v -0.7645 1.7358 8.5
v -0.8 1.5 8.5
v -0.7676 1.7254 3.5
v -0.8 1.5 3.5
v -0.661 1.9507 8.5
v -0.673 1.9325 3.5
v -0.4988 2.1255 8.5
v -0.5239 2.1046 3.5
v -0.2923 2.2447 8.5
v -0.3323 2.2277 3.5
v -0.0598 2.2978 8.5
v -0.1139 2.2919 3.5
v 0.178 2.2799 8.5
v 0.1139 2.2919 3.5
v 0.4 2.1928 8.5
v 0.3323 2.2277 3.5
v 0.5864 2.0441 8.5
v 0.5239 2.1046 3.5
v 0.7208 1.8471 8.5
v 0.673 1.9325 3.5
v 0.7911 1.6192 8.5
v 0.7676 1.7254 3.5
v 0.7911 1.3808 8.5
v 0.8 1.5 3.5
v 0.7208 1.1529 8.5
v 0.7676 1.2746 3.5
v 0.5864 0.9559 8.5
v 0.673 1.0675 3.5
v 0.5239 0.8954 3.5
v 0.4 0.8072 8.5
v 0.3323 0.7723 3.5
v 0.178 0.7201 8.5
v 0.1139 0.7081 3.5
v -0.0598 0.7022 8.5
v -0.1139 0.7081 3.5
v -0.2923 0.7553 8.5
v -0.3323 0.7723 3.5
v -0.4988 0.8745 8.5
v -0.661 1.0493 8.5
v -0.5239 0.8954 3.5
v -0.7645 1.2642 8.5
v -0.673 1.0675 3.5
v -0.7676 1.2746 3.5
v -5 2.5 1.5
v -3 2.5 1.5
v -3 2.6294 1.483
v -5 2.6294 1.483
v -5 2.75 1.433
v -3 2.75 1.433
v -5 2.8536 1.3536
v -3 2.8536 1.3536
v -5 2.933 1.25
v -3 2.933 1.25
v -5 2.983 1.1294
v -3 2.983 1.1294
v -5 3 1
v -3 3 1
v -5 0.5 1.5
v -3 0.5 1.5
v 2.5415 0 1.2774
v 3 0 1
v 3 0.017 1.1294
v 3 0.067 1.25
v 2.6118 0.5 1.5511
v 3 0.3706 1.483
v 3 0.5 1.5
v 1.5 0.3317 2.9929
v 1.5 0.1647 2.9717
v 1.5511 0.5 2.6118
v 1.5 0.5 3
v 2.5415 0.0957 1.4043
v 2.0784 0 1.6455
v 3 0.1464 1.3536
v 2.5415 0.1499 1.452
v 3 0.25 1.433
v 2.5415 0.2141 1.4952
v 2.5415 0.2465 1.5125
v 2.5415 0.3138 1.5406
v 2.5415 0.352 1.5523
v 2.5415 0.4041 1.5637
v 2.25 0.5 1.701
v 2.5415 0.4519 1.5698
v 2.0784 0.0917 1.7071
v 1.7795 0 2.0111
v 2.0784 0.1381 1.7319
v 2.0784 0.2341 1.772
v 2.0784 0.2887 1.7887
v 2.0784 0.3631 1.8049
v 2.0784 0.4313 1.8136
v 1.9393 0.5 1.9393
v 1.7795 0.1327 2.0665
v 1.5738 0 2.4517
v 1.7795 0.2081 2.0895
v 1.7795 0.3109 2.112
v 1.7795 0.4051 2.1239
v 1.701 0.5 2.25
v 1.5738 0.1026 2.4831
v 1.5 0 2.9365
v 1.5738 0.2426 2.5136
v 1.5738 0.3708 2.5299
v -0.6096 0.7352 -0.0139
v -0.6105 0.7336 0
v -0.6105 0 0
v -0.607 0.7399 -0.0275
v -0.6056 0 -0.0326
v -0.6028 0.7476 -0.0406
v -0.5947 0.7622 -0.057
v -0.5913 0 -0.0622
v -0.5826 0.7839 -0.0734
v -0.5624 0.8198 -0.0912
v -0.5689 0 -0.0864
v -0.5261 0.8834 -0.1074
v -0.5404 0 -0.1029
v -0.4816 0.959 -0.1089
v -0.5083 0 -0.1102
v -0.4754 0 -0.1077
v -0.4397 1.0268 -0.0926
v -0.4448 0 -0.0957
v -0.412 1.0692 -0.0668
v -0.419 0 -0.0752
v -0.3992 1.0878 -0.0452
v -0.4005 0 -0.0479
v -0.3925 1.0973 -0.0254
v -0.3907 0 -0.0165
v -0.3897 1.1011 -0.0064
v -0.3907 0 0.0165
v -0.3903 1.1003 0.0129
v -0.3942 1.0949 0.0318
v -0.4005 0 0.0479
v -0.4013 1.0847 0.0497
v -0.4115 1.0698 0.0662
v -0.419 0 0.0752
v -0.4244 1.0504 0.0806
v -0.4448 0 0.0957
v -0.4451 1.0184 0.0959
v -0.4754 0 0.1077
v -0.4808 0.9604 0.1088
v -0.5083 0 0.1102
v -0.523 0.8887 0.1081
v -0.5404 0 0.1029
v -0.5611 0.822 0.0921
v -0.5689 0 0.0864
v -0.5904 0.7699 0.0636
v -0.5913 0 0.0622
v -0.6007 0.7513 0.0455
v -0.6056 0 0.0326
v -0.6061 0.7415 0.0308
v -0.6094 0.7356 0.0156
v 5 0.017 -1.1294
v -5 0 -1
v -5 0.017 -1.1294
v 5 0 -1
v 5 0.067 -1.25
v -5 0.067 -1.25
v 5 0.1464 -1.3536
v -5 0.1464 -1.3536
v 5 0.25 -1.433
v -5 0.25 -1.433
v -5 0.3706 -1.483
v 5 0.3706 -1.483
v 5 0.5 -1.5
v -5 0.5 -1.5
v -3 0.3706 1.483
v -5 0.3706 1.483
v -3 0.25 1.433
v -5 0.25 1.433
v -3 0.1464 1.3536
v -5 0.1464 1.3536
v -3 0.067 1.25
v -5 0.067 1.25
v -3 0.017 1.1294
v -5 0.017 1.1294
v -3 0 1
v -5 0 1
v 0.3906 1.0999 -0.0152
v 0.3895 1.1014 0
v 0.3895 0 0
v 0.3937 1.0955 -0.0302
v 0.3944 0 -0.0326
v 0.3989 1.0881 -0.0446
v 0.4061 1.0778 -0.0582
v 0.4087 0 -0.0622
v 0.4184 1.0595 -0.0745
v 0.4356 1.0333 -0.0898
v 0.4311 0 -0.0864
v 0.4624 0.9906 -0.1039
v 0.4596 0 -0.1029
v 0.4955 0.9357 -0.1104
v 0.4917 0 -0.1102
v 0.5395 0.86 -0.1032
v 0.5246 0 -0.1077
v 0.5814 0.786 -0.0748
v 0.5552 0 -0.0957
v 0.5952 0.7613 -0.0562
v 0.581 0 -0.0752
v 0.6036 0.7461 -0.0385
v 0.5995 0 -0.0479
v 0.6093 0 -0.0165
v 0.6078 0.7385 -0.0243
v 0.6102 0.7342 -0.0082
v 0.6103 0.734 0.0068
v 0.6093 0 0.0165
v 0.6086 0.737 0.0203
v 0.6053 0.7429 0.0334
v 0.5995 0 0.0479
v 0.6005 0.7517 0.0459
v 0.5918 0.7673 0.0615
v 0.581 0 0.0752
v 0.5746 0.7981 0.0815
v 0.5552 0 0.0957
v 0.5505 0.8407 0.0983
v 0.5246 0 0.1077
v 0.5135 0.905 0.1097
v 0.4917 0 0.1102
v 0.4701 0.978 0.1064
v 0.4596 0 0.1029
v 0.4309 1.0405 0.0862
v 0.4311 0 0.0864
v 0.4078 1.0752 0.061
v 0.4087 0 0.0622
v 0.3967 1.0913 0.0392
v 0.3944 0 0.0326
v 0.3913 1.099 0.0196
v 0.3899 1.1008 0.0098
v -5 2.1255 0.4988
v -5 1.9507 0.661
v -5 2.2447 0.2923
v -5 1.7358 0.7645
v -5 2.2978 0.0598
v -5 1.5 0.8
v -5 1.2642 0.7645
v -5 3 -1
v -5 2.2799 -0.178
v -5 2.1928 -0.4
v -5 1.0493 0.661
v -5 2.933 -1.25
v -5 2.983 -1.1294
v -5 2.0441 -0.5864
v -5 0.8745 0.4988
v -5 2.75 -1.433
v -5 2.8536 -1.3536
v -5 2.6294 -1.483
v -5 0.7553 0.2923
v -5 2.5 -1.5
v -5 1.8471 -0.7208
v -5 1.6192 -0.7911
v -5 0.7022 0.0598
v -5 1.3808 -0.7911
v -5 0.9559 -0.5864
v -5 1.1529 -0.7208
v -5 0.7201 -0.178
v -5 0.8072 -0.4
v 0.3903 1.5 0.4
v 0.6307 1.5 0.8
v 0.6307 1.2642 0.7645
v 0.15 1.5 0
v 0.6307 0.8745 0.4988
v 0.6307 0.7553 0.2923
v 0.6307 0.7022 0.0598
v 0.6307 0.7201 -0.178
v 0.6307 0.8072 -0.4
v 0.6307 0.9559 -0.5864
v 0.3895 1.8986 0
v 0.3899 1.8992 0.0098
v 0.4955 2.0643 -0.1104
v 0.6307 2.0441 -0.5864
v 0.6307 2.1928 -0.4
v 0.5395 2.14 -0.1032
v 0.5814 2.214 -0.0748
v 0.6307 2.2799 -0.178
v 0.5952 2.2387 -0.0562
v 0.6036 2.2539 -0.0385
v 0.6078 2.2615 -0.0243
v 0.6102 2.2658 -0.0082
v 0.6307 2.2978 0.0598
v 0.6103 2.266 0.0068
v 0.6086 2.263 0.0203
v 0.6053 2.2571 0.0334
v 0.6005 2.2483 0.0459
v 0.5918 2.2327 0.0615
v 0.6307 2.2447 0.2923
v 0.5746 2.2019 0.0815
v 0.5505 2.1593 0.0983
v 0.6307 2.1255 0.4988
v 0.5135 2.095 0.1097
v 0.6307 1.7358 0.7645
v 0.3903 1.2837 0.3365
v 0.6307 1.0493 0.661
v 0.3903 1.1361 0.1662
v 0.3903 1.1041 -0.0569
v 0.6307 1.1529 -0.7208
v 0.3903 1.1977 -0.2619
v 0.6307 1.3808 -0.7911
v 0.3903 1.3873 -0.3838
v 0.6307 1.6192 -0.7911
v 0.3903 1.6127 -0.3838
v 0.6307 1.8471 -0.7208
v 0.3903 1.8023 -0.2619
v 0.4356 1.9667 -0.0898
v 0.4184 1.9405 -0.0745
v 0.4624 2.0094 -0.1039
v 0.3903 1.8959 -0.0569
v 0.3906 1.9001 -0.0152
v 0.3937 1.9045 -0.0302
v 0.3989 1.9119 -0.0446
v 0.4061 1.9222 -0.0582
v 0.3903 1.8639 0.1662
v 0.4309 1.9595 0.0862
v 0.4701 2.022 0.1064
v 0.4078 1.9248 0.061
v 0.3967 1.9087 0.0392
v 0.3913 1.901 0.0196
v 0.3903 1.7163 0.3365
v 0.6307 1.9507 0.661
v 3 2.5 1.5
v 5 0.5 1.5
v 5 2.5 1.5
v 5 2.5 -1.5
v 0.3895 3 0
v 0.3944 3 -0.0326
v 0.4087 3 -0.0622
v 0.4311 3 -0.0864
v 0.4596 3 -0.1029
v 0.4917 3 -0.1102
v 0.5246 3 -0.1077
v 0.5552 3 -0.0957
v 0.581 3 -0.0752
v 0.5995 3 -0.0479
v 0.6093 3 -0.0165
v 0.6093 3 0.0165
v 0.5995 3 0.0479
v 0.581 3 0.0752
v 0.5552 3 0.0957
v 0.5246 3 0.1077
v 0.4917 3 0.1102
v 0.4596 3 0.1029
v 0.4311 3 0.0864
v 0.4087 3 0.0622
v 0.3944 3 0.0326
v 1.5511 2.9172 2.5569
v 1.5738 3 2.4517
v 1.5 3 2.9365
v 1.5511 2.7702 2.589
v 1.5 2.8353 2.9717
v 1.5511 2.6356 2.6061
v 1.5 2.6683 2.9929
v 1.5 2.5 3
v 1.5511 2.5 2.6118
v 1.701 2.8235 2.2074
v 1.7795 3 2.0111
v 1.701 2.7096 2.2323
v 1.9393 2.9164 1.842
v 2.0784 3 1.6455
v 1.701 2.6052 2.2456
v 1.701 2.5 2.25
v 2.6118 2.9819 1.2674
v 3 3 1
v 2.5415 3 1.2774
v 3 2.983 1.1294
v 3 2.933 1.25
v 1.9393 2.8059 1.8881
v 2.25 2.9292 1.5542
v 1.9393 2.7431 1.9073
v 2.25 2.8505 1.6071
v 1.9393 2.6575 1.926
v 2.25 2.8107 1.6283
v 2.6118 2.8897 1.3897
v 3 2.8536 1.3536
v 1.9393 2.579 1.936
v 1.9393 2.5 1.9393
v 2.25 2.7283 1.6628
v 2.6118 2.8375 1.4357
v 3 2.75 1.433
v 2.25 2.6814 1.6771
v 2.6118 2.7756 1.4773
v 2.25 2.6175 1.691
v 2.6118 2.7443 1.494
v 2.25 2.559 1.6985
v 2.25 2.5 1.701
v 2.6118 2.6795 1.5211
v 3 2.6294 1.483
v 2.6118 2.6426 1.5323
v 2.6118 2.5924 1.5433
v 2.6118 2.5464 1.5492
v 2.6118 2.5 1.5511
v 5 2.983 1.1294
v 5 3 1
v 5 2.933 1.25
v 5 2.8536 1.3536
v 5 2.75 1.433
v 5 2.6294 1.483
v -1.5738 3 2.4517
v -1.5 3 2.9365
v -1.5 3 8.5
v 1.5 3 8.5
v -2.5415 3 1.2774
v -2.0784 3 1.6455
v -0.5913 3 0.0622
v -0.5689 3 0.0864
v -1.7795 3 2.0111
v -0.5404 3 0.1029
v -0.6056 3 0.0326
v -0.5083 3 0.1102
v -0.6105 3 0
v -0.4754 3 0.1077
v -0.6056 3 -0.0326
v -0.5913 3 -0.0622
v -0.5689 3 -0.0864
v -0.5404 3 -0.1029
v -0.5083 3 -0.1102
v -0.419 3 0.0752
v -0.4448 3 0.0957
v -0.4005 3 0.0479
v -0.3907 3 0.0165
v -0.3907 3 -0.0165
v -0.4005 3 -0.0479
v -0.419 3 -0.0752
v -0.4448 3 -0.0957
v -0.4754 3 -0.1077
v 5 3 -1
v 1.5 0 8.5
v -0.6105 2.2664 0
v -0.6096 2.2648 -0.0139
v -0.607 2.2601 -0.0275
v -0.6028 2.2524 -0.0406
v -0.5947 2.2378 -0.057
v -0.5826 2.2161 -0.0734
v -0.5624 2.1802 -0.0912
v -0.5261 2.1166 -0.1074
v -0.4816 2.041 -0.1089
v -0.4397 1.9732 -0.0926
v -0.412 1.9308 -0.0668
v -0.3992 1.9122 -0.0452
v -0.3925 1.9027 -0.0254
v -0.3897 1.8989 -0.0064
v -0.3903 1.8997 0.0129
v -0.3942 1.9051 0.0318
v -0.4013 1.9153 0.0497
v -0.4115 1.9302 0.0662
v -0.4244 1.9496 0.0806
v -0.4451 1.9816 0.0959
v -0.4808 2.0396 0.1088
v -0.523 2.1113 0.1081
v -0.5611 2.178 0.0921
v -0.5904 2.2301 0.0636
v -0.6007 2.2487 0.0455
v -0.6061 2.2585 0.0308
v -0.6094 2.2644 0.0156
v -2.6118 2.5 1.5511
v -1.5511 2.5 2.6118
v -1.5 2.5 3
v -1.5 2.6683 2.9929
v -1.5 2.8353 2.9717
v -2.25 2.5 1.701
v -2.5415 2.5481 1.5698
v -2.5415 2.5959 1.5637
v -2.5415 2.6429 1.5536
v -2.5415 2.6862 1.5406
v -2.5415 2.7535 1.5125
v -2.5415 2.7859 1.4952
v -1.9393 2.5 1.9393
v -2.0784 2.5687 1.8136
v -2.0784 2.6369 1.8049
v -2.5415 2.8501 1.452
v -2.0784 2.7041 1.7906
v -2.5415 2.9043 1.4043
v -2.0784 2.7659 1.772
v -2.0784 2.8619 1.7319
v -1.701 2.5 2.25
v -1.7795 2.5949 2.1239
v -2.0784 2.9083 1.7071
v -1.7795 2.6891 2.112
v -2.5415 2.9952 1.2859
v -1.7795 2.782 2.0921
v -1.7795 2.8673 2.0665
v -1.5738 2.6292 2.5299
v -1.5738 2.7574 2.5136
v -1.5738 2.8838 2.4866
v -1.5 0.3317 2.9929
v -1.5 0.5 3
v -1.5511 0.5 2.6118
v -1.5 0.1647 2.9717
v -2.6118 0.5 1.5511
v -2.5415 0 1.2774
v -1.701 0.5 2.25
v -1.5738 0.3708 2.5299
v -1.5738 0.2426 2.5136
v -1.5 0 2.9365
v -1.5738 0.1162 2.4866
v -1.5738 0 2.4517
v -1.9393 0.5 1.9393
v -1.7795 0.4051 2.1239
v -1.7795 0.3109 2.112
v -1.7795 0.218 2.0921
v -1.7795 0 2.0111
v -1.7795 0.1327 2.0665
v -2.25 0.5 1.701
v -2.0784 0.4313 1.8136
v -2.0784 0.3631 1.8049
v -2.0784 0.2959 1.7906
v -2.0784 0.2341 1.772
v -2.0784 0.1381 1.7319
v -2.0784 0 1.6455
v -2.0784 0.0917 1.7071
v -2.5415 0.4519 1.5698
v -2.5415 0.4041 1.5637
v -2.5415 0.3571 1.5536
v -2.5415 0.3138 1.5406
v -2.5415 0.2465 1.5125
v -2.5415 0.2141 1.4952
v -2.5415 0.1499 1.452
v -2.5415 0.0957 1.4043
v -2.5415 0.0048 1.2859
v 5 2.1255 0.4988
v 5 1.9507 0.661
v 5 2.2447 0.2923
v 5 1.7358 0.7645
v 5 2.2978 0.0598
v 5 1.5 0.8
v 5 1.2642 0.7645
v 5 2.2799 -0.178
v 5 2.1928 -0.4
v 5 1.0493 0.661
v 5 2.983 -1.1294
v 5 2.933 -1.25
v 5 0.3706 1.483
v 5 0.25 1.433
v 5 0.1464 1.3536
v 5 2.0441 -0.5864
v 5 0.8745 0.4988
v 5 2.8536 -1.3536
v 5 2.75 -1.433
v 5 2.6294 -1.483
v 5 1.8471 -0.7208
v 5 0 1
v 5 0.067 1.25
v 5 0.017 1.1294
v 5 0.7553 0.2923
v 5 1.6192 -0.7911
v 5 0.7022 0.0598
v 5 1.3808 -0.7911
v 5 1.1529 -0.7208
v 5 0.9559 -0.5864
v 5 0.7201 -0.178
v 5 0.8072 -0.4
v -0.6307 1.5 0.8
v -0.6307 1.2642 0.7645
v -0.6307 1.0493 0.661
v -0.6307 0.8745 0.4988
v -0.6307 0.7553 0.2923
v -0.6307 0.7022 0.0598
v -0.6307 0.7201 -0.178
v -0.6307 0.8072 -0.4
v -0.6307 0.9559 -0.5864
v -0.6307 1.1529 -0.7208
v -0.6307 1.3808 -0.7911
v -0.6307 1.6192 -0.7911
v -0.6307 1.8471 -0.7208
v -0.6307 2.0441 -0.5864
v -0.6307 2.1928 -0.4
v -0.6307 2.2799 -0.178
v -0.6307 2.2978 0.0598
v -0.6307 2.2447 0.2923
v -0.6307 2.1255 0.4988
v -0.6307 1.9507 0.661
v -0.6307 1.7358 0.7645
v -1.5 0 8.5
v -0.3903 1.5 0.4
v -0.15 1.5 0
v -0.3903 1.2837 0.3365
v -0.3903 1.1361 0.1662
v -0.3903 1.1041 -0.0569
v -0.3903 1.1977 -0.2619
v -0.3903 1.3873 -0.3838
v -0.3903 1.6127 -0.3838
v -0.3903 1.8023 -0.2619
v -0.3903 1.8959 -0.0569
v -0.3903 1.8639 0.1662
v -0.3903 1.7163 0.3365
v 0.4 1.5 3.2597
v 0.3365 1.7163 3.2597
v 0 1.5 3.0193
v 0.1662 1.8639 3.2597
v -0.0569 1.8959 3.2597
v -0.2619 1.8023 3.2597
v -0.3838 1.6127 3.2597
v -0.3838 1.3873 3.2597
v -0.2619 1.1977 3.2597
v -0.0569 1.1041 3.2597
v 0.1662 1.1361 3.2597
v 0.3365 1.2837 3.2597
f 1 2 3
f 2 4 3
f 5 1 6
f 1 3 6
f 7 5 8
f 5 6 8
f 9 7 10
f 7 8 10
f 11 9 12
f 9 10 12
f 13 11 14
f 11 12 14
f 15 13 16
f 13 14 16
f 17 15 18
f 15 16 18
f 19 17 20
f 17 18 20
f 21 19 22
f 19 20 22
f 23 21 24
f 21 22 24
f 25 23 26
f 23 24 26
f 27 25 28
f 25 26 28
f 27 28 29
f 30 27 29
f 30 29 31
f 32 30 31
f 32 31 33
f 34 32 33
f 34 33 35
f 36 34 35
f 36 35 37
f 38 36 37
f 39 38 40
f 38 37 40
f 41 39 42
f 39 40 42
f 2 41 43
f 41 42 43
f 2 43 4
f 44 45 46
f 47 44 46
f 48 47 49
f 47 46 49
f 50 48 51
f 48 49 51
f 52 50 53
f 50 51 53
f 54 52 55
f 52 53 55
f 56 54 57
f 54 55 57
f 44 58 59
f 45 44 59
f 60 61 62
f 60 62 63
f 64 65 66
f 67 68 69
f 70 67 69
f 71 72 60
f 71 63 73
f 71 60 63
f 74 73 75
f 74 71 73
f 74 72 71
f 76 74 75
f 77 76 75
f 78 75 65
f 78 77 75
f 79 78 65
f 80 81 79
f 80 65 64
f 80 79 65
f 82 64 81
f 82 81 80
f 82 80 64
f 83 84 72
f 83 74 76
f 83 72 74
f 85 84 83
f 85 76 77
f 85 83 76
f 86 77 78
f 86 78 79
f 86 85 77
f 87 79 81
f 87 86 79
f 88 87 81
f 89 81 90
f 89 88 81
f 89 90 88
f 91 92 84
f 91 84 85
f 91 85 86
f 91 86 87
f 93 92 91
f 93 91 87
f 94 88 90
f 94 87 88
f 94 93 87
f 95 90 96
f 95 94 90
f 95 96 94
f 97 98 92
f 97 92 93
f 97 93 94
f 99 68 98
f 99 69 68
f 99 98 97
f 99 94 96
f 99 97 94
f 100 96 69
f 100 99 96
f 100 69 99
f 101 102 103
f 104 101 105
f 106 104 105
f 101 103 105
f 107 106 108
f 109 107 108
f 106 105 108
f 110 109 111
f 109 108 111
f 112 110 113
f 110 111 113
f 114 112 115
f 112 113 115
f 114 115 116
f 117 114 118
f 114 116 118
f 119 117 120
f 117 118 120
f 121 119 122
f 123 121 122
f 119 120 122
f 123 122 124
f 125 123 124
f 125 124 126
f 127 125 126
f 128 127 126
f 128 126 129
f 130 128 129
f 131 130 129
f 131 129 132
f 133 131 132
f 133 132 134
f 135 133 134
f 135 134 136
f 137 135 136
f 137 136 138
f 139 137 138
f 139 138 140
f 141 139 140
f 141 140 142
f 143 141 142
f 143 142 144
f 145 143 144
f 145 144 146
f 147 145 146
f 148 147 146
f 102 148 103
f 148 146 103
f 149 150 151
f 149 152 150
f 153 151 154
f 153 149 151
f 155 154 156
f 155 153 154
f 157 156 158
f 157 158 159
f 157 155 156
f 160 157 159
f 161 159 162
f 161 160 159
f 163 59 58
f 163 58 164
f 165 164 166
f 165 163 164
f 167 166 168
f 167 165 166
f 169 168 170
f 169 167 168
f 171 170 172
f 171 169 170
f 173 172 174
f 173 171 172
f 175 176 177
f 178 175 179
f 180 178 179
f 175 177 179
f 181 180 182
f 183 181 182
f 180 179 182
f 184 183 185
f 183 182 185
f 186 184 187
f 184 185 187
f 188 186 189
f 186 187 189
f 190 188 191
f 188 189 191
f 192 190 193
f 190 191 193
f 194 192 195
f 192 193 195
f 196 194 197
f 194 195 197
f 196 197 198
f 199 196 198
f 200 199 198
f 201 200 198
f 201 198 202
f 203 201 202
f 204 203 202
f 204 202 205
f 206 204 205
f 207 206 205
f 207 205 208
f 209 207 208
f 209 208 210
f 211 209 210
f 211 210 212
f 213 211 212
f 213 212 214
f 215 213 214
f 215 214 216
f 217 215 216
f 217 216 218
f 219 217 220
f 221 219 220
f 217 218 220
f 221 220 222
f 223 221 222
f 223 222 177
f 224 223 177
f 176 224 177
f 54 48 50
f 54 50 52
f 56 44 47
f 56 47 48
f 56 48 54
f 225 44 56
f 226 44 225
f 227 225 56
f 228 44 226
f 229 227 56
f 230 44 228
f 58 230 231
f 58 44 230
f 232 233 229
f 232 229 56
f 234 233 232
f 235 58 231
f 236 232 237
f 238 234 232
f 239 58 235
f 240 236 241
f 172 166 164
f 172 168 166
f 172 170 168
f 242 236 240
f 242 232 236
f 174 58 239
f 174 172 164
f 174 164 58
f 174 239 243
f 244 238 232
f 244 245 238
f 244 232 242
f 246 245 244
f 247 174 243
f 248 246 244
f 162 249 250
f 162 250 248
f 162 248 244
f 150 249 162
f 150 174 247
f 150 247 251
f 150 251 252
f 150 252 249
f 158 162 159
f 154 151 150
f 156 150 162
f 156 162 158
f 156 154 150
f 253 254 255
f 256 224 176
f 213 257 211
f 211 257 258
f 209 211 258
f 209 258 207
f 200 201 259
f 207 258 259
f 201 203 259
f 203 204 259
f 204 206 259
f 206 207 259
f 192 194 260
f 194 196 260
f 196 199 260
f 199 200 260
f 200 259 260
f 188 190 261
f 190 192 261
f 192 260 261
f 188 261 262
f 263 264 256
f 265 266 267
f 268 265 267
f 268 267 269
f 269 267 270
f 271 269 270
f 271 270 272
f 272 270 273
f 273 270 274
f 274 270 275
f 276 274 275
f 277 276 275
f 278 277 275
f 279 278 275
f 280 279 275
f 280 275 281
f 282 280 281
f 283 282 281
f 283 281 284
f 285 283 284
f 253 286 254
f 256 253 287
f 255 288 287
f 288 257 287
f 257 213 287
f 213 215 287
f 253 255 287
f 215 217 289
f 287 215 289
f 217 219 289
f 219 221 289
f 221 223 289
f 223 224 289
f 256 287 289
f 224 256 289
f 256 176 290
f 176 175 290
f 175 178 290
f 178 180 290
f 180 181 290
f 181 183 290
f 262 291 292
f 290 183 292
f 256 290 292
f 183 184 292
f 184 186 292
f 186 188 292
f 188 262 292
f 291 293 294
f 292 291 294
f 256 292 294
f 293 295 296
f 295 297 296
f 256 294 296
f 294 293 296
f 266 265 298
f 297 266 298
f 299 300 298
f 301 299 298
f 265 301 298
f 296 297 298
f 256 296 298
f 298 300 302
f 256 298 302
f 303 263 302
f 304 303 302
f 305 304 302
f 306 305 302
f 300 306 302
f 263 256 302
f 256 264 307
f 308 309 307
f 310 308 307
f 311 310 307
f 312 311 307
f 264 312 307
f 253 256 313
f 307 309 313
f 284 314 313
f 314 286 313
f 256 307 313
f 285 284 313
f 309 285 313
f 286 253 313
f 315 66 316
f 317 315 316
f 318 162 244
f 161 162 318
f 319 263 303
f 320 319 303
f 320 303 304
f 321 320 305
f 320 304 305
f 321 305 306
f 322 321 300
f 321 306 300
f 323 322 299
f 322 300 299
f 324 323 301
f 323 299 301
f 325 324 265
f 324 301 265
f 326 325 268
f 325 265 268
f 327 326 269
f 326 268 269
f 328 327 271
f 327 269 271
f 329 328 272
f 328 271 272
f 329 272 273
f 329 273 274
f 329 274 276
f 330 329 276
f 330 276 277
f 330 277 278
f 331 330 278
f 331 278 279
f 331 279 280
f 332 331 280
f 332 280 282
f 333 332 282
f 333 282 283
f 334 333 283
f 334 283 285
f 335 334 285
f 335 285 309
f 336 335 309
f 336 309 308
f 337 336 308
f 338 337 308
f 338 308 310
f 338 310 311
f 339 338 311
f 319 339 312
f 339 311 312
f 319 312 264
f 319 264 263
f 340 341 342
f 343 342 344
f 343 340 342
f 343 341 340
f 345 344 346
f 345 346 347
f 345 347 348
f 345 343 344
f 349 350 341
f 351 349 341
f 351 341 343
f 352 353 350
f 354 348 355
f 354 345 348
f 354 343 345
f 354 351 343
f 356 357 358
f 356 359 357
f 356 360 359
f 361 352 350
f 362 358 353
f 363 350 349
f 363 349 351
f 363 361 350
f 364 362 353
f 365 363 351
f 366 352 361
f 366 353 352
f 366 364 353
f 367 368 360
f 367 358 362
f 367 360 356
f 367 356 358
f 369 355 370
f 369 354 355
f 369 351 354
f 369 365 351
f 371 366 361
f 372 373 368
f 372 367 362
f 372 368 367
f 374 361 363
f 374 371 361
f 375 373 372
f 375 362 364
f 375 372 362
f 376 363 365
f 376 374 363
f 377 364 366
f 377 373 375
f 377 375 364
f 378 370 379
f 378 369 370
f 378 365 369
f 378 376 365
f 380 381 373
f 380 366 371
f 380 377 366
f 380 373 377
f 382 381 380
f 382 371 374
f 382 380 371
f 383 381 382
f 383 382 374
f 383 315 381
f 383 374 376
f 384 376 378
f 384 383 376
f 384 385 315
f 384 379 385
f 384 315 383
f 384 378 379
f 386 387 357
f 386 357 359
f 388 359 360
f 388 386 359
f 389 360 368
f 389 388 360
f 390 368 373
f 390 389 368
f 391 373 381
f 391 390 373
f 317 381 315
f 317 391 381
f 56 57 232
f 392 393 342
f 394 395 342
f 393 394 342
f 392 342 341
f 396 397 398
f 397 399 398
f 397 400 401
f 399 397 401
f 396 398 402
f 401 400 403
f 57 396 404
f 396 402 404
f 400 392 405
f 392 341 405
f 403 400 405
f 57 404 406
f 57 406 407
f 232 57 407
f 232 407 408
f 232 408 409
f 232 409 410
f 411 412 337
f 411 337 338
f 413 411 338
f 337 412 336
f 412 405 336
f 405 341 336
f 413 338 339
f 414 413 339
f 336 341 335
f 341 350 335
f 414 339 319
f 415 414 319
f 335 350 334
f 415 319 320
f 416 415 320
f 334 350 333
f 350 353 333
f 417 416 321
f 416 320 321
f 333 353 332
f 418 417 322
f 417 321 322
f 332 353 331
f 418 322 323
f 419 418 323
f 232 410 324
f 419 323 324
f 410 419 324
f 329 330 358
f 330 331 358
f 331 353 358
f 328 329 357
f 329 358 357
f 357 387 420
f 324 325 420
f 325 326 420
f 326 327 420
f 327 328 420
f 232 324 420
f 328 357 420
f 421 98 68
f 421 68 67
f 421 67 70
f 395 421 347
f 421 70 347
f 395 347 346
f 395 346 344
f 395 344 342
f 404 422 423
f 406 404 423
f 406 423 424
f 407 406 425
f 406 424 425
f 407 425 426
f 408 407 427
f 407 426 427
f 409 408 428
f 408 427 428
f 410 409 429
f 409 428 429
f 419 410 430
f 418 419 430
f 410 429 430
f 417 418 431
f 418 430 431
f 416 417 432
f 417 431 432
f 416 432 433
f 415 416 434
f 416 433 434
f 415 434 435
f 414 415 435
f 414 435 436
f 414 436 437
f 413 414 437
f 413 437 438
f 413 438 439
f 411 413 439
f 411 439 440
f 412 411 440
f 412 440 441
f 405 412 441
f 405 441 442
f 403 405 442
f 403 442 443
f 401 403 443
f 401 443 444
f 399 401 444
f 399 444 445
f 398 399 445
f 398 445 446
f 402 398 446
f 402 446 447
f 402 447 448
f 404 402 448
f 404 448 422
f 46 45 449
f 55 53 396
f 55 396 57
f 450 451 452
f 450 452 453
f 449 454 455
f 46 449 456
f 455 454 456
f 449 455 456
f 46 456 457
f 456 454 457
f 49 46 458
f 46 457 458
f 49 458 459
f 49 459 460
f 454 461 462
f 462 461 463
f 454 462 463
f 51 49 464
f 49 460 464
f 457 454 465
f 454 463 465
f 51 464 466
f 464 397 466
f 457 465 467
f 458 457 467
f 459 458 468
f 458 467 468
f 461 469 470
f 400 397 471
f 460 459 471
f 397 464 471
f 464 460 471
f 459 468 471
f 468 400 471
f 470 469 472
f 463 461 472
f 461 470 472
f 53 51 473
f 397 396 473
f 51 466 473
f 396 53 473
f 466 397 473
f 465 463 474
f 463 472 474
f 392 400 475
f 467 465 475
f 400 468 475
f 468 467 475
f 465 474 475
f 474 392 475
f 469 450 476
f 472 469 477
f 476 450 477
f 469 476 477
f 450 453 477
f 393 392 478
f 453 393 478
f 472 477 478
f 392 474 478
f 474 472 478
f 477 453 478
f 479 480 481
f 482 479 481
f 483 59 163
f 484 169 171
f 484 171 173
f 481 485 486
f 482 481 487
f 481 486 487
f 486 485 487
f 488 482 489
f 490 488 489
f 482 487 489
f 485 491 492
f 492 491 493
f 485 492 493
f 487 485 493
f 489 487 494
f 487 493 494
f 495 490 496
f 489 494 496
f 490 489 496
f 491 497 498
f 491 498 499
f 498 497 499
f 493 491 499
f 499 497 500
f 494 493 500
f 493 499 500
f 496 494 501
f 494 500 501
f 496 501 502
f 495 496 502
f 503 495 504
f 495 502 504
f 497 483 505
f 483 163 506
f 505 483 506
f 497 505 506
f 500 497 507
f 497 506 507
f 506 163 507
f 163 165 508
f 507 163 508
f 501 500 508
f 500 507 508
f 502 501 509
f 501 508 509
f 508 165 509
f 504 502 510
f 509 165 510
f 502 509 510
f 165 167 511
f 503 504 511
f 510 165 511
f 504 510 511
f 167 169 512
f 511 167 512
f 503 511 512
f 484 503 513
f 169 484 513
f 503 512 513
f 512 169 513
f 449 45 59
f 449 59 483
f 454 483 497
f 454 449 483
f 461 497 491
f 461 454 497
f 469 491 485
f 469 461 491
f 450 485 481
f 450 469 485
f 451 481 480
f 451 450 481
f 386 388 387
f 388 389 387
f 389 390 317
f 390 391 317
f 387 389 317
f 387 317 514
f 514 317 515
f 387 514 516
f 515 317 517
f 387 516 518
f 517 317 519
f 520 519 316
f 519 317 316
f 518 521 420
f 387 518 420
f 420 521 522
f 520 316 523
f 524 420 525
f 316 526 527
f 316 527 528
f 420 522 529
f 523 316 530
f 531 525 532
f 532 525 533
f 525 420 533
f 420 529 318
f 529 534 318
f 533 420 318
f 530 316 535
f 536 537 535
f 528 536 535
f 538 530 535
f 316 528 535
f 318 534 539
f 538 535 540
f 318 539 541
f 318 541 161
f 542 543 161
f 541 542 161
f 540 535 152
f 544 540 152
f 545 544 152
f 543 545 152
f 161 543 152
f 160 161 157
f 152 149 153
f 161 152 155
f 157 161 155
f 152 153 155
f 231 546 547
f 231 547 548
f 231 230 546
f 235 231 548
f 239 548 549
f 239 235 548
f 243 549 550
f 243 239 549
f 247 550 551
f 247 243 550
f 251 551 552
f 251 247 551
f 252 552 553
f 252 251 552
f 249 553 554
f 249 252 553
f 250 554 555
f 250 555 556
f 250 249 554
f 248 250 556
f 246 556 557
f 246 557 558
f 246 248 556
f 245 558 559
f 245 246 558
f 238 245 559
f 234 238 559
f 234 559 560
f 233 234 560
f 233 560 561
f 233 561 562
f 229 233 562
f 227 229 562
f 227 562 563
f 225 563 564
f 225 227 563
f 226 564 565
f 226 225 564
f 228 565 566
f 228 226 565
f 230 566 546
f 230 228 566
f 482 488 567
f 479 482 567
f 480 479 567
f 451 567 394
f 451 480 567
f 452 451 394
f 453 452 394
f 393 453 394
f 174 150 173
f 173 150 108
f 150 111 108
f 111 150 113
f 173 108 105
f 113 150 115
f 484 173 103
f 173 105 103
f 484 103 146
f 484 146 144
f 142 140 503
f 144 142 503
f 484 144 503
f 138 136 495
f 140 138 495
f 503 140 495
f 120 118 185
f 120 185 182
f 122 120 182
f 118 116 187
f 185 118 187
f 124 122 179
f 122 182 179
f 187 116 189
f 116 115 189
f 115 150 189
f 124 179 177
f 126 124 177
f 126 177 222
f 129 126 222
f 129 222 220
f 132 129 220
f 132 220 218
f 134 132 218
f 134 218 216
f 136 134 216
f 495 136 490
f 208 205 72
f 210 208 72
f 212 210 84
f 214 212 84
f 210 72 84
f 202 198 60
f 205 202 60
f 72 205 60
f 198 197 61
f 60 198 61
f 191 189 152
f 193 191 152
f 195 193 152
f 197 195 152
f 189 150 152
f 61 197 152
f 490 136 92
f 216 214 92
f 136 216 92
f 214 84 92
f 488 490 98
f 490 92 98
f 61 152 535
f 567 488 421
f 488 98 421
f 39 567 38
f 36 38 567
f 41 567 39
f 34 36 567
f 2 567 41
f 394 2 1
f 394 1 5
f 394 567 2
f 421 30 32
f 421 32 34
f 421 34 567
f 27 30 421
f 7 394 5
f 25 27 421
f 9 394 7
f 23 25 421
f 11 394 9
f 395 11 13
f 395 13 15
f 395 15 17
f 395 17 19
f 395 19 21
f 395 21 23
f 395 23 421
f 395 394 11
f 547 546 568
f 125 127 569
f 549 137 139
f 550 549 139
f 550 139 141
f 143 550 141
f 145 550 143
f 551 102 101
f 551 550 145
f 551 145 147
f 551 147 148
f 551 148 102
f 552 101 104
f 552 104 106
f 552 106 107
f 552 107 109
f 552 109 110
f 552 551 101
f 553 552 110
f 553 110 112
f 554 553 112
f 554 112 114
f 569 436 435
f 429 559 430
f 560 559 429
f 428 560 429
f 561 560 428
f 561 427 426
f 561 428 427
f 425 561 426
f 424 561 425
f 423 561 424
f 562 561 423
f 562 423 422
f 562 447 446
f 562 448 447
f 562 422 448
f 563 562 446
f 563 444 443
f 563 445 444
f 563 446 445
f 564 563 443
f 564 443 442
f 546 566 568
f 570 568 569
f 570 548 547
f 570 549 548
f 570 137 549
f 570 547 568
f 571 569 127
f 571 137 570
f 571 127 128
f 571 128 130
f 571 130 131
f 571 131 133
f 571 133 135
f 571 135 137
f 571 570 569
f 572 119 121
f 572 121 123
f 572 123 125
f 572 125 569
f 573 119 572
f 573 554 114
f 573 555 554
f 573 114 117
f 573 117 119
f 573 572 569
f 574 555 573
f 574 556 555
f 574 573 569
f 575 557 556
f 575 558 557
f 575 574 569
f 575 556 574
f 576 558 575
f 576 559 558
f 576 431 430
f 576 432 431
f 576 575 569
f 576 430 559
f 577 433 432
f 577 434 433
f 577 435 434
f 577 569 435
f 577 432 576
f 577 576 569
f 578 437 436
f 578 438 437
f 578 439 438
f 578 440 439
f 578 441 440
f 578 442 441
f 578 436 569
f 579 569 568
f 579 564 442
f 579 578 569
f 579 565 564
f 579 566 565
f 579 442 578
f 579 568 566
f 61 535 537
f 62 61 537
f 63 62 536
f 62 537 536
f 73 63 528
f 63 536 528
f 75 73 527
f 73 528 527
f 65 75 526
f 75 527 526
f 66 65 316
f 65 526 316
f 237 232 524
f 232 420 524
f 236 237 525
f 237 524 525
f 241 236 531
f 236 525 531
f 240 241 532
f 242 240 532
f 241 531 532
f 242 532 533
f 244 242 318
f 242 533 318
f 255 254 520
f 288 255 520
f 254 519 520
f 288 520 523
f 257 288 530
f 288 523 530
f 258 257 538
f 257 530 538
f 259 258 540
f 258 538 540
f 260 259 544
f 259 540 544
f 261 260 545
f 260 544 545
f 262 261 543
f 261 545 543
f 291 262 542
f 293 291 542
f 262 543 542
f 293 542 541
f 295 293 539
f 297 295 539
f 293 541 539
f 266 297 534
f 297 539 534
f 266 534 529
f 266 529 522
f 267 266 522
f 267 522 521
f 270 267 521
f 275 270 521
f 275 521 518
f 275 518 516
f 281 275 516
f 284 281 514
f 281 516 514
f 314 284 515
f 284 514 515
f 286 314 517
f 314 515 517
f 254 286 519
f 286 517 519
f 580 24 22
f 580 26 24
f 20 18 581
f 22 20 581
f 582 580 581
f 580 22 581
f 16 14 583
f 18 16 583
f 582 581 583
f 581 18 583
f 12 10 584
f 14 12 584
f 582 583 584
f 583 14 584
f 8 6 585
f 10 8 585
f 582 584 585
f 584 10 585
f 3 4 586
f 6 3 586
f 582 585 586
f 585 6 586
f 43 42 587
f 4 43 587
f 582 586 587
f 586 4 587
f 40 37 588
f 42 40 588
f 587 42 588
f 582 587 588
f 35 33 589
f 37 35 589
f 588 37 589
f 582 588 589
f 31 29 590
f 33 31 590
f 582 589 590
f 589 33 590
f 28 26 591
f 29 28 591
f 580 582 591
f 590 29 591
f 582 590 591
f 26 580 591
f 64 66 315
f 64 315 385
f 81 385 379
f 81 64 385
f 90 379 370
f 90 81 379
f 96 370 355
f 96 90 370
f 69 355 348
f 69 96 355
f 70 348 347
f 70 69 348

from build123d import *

# Parameters (mm, degrees)
SKETCH1_W                    = 10
SKETCH1_H                    = 3
BOSS_EXTRUDE1_DEPTH          = 3
F_90_0_0087_DIAMETER_HOLE1_D = 0.22098
SKETCH15_W                   = 3
SKETCH15_H                   = 3
BOSS_EXTRUDE2_DEPTH          = 7
M2X0_4_TAPPED_HOLE1_D        = 1.6
M2X0_4_TAPPED_HOLE1_DEPTH    = 5
M2X0_4_TAPPED_HOLE1_TIP      = 0.480688495
FILLET4_R                    = 0.5
FILLET3_R                    = 1.5


with BuildPart() as part:
    # Sketch1 → Boss-Extrude1 (new body)
    with BuildSketch(Plane(origin=(0, 0, 0), x_dir=(1, 0, 0), z_dir=(0, 1, 0))):
        Rectangle(SKETCH1_W, SKETCH1_H)
    extrude(amount=BOSS_EXTRUDE1_DEPTH)

    # #90 (0.0087) Diameter Hole1 (through all)
    with Locations(Plane(origin=(0, 3, 0), x_dir=(1, 0, 0), z_dir=(0, 1, 0))):
        with Locations((0.5, 0), (-0.5, 0)):
            Hole(F_90_0_0087_DIAMETER_HOLE1_D / 2)

    # Sketch8 → Tap Drill for M2x0.4 Tap1 (revolve, cut)
    with BuildSketch(Plane(origin=(-5, 1.5, 0), x_dir=(0, 0, 1), z_dir=(0, 1, 0))):
        Polygon((0, 0), (0, 4.85), (0.8, 4.369311505), (0.8, 0), align=None)
    tap_drill_for_m2x0_4_tap1 = revolve(axis=Axis((-11.35, 1.5, 0), (1, 0, 0)), mode=Mode.SUBTRACT)

    # Mirror1: Tap Drill for M2x0.4 Tap1 across plane
    add(tap_drill_for_m2x0_4_tap1.mirror(Plane(origin=(0, 0, 0), x_dir=(0, 0, 1), z_dir=(1, 0, 0))), mode=Mode.SUBTRACT)

    # Sketch15 → Boss-Extrude2 (add)
    with BuildSketch(Plane.XY.offset(1.5)):
        with Locations((0, 1.5)):
            Rectangle(SKETCH15_W, SKETCH15_H)
    extrude(amount=BOSS_EXTRUDE2_DEPTH)

    # M2x0.4 Tapped Hole1
    with Locations(Plane.XY.offset(8.5)):
        with Locations((0, 1.5)):
            Hole(M2X0_4_TAPPED_HOLE1_D / 2, depth=M2X0_4_TAPPED_HOLE1_DEPTH)
            with Locations((0, 0, -(M2X0_4_TAPPED_HOLE1_DEPTH + M2X0_4_TAPPED_HOLE1_TIP / 2))):  # 118° drill point
                Cone(0, M2X0_4_TAPPED_HOLE1_D / 2, M2X0_4_TAPPED_HOLE1_TIP, mode=Mode.SUBTRACT)

    # Fillet4
    fillet4_edges = [part.edges().sort_by_distance(p)[0] for p in [
        (3.25, 3, 1.5),
        (3.25, 0, 1.5),
        (-3.25, 0, 1.5),
        (0, 0, -1.5),
        (0, 3, -1.5),
        (-3.25, 3, 1.5),
    ]]
    fillet(fillet4_edges, radius=FILLET4_R)

    # Fillet3
    fillet3_edges = [part.edges().sort_by_distance(p)[0] for p in [
        (-1.5, 1.5, 1.5),
        (-1.5, 0.146446609, 1.353553391),
        (-1.5, 2.853553391, 1.353553391),
    ]]
    fillet(fillet3_edges, radius=FILLET3_R)
    fillet3_2_edges = [part.edges().sort_by_distance(p)[0] for p in [
        (1.5, 2.853553391, 1.353553391),
        (1.5, 1.5, 1.5),
        (1.5, 0.146446609, 1.353553391),
    ]]
    fillet(fillet3_2_edges, radius=FILLET3_R)


solid = part.part
